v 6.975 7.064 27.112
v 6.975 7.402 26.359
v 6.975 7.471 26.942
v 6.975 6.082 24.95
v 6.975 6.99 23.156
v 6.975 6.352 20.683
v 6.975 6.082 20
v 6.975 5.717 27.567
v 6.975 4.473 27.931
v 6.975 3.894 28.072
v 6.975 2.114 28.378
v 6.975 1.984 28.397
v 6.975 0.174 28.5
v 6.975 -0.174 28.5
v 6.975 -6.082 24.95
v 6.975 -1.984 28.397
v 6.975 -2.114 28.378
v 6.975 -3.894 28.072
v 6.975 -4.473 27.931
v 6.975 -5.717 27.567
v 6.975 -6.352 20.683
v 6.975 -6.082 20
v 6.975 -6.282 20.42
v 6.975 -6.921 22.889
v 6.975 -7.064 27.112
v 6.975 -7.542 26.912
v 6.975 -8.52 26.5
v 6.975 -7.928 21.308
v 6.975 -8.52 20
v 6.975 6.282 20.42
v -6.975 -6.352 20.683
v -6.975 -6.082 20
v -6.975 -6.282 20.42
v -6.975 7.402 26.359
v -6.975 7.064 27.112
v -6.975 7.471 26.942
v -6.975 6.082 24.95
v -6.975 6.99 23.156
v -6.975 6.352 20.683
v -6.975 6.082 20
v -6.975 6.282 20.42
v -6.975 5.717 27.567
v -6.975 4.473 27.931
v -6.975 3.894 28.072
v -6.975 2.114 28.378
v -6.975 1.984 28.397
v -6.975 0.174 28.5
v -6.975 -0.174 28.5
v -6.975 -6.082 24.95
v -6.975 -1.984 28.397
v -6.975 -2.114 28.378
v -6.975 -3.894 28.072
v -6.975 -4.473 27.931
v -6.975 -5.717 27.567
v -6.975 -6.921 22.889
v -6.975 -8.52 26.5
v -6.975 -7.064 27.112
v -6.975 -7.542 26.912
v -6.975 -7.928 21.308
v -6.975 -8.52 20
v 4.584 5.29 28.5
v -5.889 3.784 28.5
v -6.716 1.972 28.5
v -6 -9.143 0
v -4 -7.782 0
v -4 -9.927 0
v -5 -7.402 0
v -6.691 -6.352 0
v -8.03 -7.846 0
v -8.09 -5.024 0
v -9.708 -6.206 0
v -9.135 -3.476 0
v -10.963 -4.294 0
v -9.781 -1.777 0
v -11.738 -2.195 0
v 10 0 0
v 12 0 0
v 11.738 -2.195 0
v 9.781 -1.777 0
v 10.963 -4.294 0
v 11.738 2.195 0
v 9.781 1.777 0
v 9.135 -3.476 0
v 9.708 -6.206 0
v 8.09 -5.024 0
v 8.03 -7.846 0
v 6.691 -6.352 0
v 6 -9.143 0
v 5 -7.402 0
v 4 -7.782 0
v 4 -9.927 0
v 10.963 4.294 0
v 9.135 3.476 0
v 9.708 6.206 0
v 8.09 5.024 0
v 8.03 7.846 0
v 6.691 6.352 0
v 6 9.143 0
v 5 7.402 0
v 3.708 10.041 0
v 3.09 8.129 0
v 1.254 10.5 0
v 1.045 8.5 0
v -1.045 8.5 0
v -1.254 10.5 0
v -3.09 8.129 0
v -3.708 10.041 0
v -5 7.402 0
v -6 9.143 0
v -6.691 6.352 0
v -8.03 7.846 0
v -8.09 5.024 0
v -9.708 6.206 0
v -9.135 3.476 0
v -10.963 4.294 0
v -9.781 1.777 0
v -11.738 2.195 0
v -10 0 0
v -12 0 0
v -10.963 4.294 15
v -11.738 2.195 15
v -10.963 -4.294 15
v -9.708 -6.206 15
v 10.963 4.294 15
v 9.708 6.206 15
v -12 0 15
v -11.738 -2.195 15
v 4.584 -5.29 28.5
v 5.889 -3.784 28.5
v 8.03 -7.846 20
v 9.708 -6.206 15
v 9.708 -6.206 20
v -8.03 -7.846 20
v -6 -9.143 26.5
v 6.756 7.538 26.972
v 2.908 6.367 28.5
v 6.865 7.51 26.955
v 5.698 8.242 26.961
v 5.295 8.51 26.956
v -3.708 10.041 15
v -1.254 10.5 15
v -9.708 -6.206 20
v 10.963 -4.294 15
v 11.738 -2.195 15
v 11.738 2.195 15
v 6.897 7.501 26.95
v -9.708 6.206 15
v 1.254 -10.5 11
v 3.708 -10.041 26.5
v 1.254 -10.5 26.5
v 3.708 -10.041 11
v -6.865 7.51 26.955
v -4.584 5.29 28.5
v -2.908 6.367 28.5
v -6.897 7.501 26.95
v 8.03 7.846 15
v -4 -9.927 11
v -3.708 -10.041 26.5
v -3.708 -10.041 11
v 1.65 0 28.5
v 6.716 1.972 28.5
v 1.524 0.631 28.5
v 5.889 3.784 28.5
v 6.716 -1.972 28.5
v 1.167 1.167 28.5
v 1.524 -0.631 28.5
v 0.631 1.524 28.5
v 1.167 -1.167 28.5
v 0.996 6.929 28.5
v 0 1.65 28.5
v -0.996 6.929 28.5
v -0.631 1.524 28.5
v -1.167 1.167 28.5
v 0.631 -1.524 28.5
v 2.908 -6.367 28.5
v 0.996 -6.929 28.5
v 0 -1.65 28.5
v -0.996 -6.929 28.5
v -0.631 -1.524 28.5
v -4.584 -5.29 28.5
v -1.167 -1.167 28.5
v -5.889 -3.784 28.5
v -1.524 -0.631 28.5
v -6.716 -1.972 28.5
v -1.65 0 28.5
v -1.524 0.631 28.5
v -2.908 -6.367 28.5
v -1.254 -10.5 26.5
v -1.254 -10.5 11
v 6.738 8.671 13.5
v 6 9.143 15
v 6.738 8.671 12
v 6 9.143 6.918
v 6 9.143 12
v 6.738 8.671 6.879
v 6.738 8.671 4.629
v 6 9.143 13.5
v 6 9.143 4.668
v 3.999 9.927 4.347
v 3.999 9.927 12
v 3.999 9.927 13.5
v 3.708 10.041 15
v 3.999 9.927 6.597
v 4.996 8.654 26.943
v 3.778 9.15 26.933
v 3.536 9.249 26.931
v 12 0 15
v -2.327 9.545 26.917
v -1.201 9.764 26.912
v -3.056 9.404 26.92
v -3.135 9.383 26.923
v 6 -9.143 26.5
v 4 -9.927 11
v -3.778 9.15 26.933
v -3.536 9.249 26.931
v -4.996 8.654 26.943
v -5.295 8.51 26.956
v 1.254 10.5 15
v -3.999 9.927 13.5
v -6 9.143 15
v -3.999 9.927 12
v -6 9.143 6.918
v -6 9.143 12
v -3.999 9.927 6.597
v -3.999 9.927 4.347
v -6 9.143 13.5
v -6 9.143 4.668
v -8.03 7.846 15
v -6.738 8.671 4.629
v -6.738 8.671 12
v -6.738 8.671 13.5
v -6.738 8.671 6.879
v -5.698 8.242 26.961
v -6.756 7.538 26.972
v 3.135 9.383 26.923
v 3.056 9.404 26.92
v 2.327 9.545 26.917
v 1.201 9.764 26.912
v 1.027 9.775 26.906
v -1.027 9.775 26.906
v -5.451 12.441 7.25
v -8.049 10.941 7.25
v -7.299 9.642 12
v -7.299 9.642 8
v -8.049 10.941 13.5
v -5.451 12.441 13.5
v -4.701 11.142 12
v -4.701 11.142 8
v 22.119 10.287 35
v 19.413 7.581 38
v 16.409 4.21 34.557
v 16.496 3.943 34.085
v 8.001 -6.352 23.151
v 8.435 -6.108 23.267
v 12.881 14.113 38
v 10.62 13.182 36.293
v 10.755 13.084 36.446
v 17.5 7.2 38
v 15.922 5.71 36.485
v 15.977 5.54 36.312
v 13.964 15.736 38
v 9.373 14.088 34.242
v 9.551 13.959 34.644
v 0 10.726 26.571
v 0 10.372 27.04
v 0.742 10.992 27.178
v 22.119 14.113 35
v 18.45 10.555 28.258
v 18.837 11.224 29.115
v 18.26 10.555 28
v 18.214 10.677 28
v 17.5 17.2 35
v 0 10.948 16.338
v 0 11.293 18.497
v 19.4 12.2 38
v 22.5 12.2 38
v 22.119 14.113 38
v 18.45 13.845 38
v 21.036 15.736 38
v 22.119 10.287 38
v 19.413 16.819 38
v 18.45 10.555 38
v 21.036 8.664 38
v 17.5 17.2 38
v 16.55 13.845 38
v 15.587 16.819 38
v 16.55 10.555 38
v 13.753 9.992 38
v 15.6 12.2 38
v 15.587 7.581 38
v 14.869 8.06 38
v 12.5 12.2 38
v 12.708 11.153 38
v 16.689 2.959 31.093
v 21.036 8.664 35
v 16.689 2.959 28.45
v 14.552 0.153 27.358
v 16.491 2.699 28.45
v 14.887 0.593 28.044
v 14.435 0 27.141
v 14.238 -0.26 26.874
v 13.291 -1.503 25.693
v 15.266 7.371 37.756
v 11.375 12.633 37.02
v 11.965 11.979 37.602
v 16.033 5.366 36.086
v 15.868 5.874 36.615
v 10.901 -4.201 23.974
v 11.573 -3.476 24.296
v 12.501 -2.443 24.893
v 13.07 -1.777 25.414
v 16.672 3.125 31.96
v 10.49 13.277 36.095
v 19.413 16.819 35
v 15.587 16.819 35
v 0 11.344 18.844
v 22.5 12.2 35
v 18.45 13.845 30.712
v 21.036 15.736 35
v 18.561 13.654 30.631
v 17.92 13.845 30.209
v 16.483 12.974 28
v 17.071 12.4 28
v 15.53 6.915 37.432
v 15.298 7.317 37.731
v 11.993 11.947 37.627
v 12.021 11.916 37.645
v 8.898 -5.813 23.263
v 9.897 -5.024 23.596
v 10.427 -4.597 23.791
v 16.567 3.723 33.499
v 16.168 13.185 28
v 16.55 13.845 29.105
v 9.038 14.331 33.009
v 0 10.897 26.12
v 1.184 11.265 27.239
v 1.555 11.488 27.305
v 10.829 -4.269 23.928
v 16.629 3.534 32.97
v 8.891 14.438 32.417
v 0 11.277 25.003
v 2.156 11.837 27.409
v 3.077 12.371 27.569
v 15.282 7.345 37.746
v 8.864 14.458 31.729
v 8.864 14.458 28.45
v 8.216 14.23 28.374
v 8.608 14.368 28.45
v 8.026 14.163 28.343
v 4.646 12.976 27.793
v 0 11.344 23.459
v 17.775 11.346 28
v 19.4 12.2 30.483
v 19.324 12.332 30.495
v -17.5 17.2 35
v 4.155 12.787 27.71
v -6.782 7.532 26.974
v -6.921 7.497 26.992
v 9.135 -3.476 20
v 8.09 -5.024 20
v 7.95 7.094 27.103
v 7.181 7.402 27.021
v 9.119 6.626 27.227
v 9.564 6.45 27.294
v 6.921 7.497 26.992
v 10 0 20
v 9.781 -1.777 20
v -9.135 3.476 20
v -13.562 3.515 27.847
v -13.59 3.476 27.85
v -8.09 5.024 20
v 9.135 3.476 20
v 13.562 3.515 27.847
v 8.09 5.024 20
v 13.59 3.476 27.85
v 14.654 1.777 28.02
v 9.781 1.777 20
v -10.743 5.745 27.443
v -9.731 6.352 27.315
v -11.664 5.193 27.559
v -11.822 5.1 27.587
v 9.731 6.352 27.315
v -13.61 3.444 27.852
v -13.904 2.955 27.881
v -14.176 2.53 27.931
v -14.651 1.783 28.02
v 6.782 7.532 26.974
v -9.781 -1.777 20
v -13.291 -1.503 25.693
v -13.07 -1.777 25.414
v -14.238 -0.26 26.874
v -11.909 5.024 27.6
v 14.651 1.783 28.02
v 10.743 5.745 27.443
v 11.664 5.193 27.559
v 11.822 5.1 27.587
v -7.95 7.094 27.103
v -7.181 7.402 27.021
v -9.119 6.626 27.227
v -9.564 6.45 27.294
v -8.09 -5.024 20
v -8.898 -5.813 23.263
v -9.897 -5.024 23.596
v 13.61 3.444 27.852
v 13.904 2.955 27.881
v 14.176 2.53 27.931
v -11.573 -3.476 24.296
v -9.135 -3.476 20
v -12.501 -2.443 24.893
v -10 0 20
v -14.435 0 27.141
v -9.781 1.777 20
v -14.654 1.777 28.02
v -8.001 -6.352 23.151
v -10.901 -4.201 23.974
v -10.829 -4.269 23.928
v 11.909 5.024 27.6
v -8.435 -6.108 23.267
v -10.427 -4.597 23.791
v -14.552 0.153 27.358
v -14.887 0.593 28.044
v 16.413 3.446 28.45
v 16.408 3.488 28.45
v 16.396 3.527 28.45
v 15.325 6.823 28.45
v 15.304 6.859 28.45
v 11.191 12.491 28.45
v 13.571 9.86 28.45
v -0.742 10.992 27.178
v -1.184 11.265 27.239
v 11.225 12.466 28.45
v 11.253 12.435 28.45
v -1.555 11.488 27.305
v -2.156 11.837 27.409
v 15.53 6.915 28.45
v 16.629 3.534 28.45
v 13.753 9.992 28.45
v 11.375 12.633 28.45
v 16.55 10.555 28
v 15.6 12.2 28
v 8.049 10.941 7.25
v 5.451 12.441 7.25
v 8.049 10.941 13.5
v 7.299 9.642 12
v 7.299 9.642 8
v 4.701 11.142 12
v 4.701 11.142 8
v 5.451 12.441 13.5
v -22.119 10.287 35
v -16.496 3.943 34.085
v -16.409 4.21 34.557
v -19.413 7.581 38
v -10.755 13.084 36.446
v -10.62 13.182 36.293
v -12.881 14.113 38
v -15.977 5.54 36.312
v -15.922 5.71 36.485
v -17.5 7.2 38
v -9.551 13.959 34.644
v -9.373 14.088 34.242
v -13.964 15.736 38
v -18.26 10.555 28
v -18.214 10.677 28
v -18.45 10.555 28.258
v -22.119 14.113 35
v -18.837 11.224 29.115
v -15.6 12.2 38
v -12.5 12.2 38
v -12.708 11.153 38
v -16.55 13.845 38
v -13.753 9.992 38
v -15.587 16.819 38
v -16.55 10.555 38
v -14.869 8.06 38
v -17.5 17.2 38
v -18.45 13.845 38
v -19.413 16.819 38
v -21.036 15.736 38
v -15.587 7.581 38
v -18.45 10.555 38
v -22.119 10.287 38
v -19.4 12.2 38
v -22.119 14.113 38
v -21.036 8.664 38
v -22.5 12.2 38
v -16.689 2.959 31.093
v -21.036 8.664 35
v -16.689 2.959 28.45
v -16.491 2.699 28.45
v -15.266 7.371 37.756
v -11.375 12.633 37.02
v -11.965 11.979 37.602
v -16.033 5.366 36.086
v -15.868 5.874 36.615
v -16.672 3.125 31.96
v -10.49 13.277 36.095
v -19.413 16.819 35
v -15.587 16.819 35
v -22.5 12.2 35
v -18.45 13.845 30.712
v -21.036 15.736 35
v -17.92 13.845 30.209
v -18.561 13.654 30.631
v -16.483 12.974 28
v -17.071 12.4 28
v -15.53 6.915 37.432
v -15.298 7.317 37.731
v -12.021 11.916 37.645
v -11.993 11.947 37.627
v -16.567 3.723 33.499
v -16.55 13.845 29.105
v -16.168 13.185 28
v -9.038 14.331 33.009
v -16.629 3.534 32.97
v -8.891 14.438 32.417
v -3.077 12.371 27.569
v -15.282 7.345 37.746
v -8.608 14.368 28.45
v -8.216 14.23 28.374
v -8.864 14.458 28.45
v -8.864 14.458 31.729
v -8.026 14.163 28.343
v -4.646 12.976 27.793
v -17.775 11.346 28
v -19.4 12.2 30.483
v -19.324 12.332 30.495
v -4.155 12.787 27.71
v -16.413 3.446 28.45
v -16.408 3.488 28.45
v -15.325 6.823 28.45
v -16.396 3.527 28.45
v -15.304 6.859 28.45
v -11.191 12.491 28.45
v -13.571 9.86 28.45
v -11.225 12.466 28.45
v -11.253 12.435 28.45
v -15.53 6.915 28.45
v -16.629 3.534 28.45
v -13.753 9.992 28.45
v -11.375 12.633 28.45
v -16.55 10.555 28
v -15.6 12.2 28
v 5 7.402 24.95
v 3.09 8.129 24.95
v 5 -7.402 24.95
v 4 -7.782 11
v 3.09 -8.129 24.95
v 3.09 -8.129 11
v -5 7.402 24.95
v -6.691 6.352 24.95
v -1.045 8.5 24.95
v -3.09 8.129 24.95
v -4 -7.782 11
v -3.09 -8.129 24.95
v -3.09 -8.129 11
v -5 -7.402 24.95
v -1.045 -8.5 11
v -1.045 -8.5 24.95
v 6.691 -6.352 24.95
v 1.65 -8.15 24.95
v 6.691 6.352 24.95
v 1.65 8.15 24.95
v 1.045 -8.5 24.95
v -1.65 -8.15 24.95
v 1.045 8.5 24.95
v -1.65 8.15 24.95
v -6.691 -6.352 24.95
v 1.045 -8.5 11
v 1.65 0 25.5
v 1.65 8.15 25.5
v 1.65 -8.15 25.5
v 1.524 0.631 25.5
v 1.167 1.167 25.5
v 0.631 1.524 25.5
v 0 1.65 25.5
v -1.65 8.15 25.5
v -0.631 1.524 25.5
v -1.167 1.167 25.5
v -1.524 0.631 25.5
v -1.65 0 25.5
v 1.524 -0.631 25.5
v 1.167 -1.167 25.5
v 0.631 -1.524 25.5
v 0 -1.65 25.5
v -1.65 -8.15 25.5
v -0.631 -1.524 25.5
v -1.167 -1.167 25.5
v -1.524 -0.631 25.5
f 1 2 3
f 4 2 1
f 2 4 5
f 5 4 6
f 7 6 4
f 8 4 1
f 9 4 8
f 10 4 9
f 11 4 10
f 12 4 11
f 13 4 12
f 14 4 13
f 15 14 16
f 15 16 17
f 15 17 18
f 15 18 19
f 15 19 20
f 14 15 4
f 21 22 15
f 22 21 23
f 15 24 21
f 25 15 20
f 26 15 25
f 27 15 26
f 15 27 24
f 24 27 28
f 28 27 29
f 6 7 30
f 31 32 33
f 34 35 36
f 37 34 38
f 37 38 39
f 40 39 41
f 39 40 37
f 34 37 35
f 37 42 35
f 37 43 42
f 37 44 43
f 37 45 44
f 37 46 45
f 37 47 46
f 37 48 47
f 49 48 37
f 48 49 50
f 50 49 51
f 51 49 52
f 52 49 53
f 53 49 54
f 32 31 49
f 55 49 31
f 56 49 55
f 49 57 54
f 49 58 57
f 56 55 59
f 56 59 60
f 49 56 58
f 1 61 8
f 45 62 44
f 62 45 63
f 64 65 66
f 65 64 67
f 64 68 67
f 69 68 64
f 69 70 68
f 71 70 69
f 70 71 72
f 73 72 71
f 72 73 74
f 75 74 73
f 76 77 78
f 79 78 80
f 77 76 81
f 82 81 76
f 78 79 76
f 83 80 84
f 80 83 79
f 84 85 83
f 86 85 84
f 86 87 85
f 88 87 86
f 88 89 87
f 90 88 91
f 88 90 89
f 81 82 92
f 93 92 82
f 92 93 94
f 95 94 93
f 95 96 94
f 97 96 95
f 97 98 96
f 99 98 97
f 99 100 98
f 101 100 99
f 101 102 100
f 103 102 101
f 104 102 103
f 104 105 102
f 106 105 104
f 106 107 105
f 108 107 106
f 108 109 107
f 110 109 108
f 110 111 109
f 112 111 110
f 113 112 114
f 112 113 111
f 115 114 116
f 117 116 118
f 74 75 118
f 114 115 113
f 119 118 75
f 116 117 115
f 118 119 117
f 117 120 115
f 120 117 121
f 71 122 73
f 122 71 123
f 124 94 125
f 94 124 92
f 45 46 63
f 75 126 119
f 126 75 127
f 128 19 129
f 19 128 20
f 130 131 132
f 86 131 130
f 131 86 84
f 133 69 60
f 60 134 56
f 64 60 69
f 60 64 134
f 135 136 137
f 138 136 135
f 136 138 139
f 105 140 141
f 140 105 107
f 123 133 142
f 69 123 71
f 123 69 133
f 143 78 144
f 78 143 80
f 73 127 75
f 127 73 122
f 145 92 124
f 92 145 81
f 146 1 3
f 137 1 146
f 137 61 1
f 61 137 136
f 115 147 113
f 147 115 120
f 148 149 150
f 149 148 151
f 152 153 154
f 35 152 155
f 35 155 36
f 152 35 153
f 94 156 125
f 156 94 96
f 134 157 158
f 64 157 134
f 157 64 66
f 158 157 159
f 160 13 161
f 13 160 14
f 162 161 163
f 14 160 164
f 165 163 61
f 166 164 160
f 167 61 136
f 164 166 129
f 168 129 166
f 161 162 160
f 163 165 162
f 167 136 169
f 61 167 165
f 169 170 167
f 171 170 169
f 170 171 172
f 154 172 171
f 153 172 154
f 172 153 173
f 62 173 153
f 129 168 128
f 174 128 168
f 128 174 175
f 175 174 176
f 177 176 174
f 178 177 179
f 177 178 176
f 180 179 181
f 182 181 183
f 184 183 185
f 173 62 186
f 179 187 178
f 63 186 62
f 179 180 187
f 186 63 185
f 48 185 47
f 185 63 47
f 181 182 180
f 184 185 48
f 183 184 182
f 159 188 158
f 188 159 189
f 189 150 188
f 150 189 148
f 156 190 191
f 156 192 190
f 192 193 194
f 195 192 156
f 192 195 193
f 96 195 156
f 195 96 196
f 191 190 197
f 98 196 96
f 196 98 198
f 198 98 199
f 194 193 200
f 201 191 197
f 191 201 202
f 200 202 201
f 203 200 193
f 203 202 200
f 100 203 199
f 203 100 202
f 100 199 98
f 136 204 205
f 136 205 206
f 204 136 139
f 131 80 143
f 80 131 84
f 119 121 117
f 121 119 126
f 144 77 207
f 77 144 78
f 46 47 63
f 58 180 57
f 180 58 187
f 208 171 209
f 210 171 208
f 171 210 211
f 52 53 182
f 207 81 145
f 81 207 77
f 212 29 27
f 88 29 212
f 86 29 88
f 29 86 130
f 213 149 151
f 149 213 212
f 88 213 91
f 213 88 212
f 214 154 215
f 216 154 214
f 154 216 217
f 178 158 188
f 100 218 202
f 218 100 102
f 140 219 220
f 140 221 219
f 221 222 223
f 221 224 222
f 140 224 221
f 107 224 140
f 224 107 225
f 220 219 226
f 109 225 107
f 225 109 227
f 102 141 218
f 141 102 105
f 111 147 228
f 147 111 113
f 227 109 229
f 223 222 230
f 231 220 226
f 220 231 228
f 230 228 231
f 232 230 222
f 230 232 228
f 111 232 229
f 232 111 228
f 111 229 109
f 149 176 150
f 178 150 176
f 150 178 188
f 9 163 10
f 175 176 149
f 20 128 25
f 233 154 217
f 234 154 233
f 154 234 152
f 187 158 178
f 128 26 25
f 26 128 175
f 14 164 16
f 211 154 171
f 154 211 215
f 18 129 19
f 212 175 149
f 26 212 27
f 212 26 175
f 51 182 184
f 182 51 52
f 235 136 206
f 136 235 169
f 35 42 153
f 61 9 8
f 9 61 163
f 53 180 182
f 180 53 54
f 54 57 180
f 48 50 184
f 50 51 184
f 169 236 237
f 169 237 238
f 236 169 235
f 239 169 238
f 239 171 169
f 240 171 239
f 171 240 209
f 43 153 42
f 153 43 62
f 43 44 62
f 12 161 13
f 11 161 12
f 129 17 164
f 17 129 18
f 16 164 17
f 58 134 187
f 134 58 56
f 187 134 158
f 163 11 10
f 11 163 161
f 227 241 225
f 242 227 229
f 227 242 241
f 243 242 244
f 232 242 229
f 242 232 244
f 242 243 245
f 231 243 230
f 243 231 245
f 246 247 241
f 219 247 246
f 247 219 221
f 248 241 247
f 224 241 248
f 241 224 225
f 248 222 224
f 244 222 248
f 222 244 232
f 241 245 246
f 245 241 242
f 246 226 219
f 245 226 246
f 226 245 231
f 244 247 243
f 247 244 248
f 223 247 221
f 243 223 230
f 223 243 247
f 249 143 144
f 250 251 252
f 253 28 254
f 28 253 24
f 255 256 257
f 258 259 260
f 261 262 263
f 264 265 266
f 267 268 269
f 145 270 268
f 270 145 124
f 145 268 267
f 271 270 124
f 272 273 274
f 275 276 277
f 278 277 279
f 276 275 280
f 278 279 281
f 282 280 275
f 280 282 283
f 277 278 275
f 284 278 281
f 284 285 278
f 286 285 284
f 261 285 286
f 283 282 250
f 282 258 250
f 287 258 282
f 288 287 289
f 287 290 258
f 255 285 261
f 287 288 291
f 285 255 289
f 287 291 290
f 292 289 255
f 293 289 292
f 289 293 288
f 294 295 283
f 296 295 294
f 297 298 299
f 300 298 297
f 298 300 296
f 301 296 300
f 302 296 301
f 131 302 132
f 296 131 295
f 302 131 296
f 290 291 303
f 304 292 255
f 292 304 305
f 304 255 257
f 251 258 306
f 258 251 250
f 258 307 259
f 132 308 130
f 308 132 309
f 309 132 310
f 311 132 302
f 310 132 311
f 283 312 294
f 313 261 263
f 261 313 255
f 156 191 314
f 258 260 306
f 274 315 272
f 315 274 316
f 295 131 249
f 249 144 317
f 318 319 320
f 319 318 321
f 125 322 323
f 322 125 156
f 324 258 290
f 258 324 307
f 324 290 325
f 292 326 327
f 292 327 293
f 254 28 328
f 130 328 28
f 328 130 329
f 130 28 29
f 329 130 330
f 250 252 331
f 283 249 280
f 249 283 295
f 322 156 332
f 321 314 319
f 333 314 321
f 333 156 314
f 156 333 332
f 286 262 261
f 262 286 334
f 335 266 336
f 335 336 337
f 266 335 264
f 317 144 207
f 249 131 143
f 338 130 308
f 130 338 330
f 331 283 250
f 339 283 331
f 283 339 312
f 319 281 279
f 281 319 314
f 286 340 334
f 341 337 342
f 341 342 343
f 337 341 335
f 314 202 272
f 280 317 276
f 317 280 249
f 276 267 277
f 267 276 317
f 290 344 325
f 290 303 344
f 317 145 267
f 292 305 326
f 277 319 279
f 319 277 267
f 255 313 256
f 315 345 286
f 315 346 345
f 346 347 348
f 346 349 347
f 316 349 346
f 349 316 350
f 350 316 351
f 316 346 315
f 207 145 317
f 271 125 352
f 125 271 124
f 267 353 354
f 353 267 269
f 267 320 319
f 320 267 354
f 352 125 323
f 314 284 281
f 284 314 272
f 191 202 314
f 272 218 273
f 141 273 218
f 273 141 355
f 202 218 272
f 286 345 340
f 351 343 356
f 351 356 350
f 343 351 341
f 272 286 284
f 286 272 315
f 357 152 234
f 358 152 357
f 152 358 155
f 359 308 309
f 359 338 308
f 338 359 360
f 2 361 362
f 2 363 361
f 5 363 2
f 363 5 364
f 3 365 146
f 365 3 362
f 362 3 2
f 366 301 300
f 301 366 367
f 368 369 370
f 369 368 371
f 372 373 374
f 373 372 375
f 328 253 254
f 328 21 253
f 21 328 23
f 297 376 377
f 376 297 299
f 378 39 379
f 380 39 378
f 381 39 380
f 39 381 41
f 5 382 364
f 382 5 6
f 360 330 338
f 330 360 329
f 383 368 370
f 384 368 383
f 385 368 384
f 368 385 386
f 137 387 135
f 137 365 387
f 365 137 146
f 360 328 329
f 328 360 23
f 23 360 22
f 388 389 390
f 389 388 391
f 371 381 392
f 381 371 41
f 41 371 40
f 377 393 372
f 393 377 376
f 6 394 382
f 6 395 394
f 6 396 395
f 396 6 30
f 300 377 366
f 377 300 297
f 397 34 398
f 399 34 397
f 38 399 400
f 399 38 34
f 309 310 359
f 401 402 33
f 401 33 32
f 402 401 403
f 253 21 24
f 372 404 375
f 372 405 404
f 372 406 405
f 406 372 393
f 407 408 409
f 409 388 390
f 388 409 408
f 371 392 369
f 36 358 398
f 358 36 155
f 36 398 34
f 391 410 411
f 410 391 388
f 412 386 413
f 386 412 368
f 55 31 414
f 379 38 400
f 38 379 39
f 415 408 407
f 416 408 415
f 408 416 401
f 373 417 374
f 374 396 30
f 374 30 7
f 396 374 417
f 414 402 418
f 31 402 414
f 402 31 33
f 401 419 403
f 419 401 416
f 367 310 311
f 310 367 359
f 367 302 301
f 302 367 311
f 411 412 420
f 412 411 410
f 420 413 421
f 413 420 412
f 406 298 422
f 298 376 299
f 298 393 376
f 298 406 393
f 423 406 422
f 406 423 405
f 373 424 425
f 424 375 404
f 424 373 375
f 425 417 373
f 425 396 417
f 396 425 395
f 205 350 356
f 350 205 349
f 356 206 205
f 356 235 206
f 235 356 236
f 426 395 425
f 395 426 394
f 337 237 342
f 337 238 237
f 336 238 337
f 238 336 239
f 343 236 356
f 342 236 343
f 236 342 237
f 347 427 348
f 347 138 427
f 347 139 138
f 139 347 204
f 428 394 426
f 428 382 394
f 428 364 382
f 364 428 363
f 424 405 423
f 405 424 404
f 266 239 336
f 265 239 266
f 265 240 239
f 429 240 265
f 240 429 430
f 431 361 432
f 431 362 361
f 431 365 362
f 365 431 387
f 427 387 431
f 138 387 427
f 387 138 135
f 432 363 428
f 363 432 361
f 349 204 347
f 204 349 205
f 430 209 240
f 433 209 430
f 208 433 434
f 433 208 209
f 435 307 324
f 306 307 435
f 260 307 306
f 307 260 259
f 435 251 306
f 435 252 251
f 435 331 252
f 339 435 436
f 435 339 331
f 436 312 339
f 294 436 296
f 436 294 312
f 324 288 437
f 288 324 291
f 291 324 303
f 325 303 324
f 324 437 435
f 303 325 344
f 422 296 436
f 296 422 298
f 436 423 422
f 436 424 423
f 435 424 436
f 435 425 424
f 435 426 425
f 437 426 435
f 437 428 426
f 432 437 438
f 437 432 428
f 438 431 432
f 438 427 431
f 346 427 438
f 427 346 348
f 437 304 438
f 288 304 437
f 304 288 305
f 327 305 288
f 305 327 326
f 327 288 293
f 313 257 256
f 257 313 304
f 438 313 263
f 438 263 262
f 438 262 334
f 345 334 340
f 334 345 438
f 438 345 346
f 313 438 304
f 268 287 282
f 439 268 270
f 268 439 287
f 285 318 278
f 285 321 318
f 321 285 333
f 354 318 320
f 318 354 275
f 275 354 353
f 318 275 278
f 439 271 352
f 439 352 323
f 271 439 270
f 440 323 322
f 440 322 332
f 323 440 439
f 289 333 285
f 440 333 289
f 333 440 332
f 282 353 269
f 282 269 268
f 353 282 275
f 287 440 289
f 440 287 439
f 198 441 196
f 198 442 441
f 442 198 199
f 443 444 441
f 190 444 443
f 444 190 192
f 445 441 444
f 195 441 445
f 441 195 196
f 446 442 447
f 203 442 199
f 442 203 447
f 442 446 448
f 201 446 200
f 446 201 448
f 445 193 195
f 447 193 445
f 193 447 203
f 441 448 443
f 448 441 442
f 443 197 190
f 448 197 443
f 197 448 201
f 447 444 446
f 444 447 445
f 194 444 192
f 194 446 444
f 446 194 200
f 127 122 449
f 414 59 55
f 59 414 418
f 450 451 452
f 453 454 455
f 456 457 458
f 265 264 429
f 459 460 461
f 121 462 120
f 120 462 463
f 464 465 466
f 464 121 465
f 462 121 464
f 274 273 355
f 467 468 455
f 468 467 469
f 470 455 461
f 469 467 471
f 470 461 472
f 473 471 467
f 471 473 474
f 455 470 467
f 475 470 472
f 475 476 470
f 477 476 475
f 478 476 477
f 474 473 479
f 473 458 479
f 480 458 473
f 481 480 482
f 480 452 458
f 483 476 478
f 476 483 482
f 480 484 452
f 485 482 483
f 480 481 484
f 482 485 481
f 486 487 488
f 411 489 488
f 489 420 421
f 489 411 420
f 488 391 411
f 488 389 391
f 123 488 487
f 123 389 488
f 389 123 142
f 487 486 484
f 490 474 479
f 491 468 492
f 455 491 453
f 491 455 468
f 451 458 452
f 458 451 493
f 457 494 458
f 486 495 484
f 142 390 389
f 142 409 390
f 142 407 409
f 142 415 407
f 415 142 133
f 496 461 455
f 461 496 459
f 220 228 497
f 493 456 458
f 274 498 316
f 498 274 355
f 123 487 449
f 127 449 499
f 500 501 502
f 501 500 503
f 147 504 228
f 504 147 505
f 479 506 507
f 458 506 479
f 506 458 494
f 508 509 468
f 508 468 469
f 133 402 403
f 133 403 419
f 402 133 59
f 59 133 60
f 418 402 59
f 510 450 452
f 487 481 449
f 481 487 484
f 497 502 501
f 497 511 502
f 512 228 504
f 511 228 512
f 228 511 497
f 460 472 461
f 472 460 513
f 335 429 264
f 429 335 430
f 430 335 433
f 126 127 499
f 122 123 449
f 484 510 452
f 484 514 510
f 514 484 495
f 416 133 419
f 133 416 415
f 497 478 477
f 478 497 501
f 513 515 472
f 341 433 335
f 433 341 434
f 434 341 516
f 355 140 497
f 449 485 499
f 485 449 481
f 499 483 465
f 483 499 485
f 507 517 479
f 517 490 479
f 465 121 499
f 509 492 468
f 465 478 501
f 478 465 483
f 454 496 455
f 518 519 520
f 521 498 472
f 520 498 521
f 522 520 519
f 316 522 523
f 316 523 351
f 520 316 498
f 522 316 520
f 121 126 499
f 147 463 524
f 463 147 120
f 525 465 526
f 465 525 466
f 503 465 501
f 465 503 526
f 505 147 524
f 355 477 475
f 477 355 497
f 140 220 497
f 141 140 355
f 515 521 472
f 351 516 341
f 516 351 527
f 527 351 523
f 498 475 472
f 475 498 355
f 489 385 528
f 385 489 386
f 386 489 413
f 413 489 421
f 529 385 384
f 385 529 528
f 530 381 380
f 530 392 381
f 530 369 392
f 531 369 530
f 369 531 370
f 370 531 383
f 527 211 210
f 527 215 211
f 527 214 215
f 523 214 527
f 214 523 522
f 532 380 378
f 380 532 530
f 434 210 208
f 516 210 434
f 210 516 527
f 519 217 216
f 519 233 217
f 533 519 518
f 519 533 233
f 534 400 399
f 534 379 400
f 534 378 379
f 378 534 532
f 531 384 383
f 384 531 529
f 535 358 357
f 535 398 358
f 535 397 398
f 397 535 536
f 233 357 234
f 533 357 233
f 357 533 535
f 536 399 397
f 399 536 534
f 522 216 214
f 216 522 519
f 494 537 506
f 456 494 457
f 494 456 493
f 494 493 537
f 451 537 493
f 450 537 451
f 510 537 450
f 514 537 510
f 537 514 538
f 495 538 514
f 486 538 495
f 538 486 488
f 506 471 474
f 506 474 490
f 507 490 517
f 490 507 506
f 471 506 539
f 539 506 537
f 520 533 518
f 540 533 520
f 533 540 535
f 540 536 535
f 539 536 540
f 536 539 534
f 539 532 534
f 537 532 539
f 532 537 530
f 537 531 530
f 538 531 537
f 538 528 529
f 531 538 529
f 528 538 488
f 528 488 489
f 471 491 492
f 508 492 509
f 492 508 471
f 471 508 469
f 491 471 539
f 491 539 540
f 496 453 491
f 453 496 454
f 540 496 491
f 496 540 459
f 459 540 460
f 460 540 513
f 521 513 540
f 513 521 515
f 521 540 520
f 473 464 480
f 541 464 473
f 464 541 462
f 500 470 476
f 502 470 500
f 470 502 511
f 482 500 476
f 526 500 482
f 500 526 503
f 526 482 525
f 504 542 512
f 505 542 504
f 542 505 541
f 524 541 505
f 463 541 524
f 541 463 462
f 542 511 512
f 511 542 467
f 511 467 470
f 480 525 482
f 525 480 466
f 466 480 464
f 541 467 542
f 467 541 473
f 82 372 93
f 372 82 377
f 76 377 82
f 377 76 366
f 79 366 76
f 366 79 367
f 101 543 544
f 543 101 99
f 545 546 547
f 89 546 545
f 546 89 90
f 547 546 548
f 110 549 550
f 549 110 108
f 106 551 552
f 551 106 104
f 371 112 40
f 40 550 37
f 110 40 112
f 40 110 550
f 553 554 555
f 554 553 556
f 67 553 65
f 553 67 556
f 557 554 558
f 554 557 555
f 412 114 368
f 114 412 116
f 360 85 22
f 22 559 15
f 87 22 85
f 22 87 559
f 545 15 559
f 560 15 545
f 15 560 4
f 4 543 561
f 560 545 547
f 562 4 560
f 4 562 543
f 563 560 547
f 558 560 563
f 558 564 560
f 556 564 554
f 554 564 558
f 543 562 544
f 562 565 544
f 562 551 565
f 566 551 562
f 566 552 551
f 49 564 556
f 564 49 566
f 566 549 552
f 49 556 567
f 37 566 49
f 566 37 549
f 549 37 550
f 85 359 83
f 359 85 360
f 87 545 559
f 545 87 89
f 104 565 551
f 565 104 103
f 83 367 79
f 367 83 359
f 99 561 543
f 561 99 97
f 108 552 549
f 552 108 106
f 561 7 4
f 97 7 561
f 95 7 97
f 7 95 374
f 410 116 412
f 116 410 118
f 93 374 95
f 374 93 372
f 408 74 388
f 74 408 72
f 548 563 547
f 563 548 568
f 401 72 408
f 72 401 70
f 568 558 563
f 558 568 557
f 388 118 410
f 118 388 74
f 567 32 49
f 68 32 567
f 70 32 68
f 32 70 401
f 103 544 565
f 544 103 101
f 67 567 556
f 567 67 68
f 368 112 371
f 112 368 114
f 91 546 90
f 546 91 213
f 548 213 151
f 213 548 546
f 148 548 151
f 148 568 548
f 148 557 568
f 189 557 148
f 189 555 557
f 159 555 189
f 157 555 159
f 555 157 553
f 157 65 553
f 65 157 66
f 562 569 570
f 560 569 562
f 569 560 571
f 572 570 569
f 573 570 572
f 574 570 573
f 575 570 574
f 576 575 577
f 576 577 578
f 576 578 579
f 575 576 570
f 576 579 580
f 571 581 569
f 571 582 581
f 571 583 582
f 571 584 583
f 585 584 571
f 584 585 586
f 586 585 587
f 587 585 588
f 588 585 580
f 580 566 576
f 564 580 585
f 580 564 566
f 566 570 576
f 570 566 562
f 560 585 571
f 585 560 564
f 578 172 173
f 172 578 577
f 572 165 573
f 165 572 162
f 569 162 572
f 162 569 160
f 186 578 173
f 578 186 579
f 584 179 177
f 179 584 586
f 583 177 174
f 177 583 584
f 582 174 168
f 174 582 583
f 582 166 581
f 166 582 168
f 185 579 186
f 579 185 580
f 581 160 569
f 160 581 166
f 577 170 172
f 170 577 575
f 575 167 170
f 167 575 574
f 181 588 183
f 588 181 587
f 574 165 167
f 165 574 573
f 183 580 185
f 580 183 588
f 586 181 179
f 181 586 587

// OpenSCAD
use <./utilities.scad>;

ns_flex = [2.5,1,0.75];
ns_outer_r = 7;
ns_top_h = 20;
band_clearance_r = 3;
ss_wall_t = 2;
d=0.05;
actuator_h = 6;
zflex_l = 1.5;    //length and height of flexures
zflex_t = 0.75;

function ss_inner(travel)=[2*(ns_outer_r+band_clearance_r),2*(ns_outer_r+1.5),ns_top_h+travel];
function ss_outer(travel)=ss_inner(travel)+[2*ss_wall_t,2*ss_wall_t,3];

module cable_tie_point(t=1.5, gap=[3,1.5,4]){
    w=gap[0];
    sequential_hull(){
        translate([0,-t/2,-gap[1]-gap[2]/2-5*t/4]) cube([w,t,t/2],center=true);
        translate([0,gap[1]+t/2,-gap[2]/2-t/4]) cube([w,t,t/2],center=true);
        translate([0,gap[1]+t/2,gap[2]/2+t/2]) cube([w,t,t],center=true);
        translate([0,-t/2,gap[2]/2+t/2]) cube([w,t,t],center=true);
    }
}

module screw_seat(travel=5, motor_lugs=false){
	inner=ss_inner(travel);
	outer=ss_outer(travel);
    top_h=outer[2]-1.5;
    motor_shaft_pos=[0,20,outer[2]+d];
    motor_screw_pos=[35/2,motor_shaft_pos[1]-7.8,outer[2]+10];
    t=3;
    module inner_silhouette(h=d){
        resize([inner[0],inner[1],h]) cylinder(r=inner[1]);
    }
	difference(){
		union(){ 
            //////// body of seat (cylinder with conical top)
            difference(){
                hull(){
                    resize(outer-[0,0,1.5]) cylinder(r=outer[1]); //body
                    translate([0,0,outer[2]-1.5]) cylinder(r=outer[0]/2-5,h=2); //body
                }
                //hole for elastic bands	
                reflect([1,0,0]) translate([outer[0]/2-2.5,0,inner[2]]) cube([5+d,outer[1],2*travel],center=true);
			}
            //////// motor lugs
            if(motor_lugs) reflect([1,0,0]) difference(){
                union(){
                    hull(){
                        translate(motor_screw_pos) mirror([0,0,1]) cylinder(r=5,h=3);
                        translate([0,0,inner[2]-travel-5]) resize([outer[0],outer[1],5]) cylinder(r=outer[1]);
                    }
                    rotate(30) translate([0,outer[1]/2,inner[2]-travel-10]) cable_tie_point();
                }
                //space for gears
                translate([0,0,outer[2]-1.5]) cylinder(r1=8,r2=17,h=2);
                translate([0,0,outer[2]-1.5+2-d]) cylinder(h=999,r=17);
                //hollow inside of the structure
                sequential_hull(){
                    translate([0,0,0]) inner_silhouette();
                    translate([0,0,inner[2]-travel]) inner_silhouette();
                    translate([0,0,outer[2]+d]) resize([30,inner[1],999]) cylinder(h=999,r=15);
                }
                //mounting screws
                translate(motor_screw_pos) cylinder(r=1.9,h=20,center=true);
            }

		//		
		}

		//clearance for actuator
		translate([0,0,-d]) resize(inner) cylinder(r=inner[1]);
		translate([0,-outer[1]/2,0]) cube([8,ss_wall_t*3,(actuator_h+travel)*2],center=true);

		//hole for nut at top
		translate([0,0,inner[2]]) cube([3.3,inner[1]-0.7,1],center=true);
		translate([0,0,0]) cylinder(r=3.3/2,h=999, $fn=16, center=true);
	}
}

module screw_seat_spring(travel=5, motor_lugs=false){
	inner=ss_inner(travel);
	outer=ss_outer(travel);
    top_h=outer[2]-1.5;
    motor_shaft_pos=[0,20,outer[2]+d];
    motor_screw_pos=[35/2,motor_shaft_pos[1]-7.8,outer[2]+10];
    t=3;
    module inner_silhouette(h=d){
        resize([inner[0],inner[1],h]) cylinder(r=inner[1]);
    }
	difference(){
		union(){ 
            //////// body of seat (cylinder with conical top)
            difference(){
                hull(){
                    resize(outer-[0,0,1.5]) cylinder(r=outer[1]); //body
                    translate([0,0,outer[2]-1.5]) cylinder(r=outer[0]/2-5,h=2); //body
                }
                //hole for spring
                translate([0,outer[1]/2-2.5,inner[2]]) cube([outer[0],5+d,20],center=true);
			}
            //////// motor lugs
            if(motor_lugs) reflect([1,0,0]) difference(){
                union(){
                    hull(){
                        translate(motor_screw_pos) mirror([0,0,1]) cylinder(r=5,h=3);
                        translate([0,0,inner[2]-travel-5]) resize([outer[0],outer[1],5]) cylinder(r=outer[1]);
                    }
                    rotate(30) translate([0,outer[1]/2,inner[2]-travel-10]) cable_tie_point();
                }
                //space for gears
                translate([0,0,outer[2]-1.5]) cylinder(r1=8,r2=17,h=2);
                translate([0,0,outer[2]-1.5+2-d]) cylinder(h=999,r=17);
                //hollow inside of the structure
                sequential_hull(){
                    translate([0,0,0]) inner_silhouette();
                    translate([0,0,inner[2]-travel]) inner_silhouette();
                    translate([0,0,outer[2]+d]) resize([30,inner[1],999]) cylinder(h=999,r=15);
                }
                //mounting screws
                translate(motor_screw_pos) cylinder(r=1.9,h=20,center=true);
            }

		//		
		}

		//clearance for actuator
		translate([0,0,-d]) resize(inner) cylinder(r=inner[1]);
		translate([0,-outer[1]/2,0]) cube([8,ss_wall_t*3,(actuator_h+travel)*2],center=true);

		//hole for nut at top
		translate([0,0,inner[2]]) cube([inner[0]-0.7,3.3,1],center=true);
		translate([0,0,0]) cylinder(r=3.3/2,h=999, $fn=16, center=true);
	}
}

module nut_seat_spring(){
	outer_r=5.5; //outer radius
	top_h=ns_top_h; //overall height
	union(){
		//central nut seat
		difference(){
			union(){
				cylinder(r=outer_r,h=ns_top_h);
                difference(){
                    cylinder(r=outer_r+2,h=6);
                    translate([-99,0,6]) rotate([90+30,0,0]) cube([1,1,1]*999);
                }
				
			}

			//nut
			rotate(30) translate([0,0,ns_top_h-9]) nut_from_bottom(3, h=7,chamfer_h=4);
			//make sure the hole for the nut prints ok in the overhang
			//essentially we ensure that the overhang never goes
			//more than 45 degrees (the hexagonal hole would do this)
			//then bridge it at the top.  This tapers nicely into
			//the hexagonal nut hole to avoid spaghetti.
			assign(r=3*0.9*1.2+0.75) assign(w=r*cos(30)*0.8*2) translate([0,0,actuator_h]) sequential_hull(){
				rotate(30) cylinder(r=r,$fn=6,h=r*1.5);
				translate([-w/2,-r,0]) cube([w,r,r]);
				translate([-r*cos(30)*0.8,-999,0]) cube([w,2*r,r]);
			}
			//flexures
			translate([0,0,zflex_t+1]) cube([999,zflex_l,2],center=true);
			//wedge to make flexure
			hull(){
				translate([0,0,zflex_t+1.75]) cube([999,zflex_l,0.5],center=true);
				translate([-999,-outer_r-d,actuator_h+1]) cube([999*2,d,outer_r+4+zflex_t-actuator_h-1]);
			}
			translate([-999,-ns_outer_r-1,actuator_h]) cube([999*2,3,2]); //truncate the yoke so it has a flat bit to mesh neatly with the actuator
		}
	}
}

/*union(){
    screw_seat_spring(5);
    nut_seat_spring();
    translate([-3,-20-4,0]) cube([6,20,6]);
    difference(){
        reflect([1,0,0]) translate([4,-20-4-1-2,0]) cube([2,22,8]);
        scale([0.95,0.95,1]) screw_seat_outline(center=true);
    }
    translate([-6,-20-4-1-2,0]) cube([6*2,2,4]);
    translate([-3,-20-4-1-2,0]) cube([6,6,0.75]);
}*/


module screw_seat_silhouette(adjustment=0,travel=5){
	assign(inner=ss_inner(travel))
	assign(outer=ss_outer(travel))
	resize([outer[0]+adjustment,outer[1]+adjustment]) circle(r=outer[1]); //body
}
module screw_seat_outline(h=999,adjustment=0,center=false){
	linear_extrude(h,center=center) screw_seat_silhouette(adjustment);
}
module elastic_band_base(h=15,tilt=7){
	assign(inner=ss_inner(5))
	assign(outer=ss_outer(5))
	intersection(){
		translate([-1,-1,0]*999) cube([1,1,1]*999*2); //make sure there's nothing below the XY plane
		translate([0,outer[1]/2,0]) rotate([-tilt,0,0]) translate([0,-outer[1]/2,0]) union(){ //tip over from one corner to make foot
			difference(){
				translate([0,0,-10]) resize([outer[0],outer[1],h+10]) cylinder(r=outer[1]); //body (with some below zero to allow spare when we tilt over)
				translate([0,0,-20]) difference(){
					resize([inner[0]-d,inner[1],999]) cylinder(r=inner[1]); //cutout for nut seat
					cube([inner[0]-8,999,20*2+6],center=true); //crossbar for bands
				}
				//indents for elastic bands
				reflect([0,1,0]) translate([0,4,0]) rotate([5,0,0]){
				//	cube([999,2,6],center=true);
					translate([0,0,-10]) cube([inner[0]-7,2,22],center=true);
				}
				//clearance for actuator arm
				translate([0,999,h]) cube([9,999*2,12],center=true);
			}
			intersection(){ //grips for hole in microscope
				difference(){ //hollow extruded ellipse
					translate([0,0,h-5]) resize([inner[0],inner[1],5+1]) cylinder(r=inner[1]);
					translate([0,0,h-6]) resize([inner[0],inner[1],6+2]) cylinder(r1=inner[1],r2=inner[1]-1.5);
				}
				hull(){ //just the bits at either side
					translate([0,0,-10]) cube([999,6,d],center=true);
					translate([0,0,h+1]) cube([999,6,d],center=true);
				}
			}
		}
	}
}
	

module nut_seat_with_flex(){
	assign(
				outer_r=ns_outer_r, //outer radius
				top_h=ns_top_h //overall height
			 ) union(){
		//central nut seat
		difference(){
			union(){
				cylinder(r=ns_outer_r,h=ns_top_h);
				reflect([1,0,0]) sequential_hull(){
					translate([0,0,top_h-8]) cylinder(r=ns_outer_r,h=d);
					translate([0,0,top_h-1]) scale([1+2/ns_outer_r,1,1]) cylinder(r=ns_outer_r,h=1);
				} //flare the top
			}

			//nut
			rotate(30) translate([0,0,ns_top_h-9]) nut_from_bottom(3, h=7,chamfer_h=4);
			//make sure the hole for the nut prints ok in the overhang
			//essentially we ensure that the overhang never goes
			//more than 45 degrees (the hexagonal hole would do this)
			//then bridge it at the top.  This tapers nicely into
			//the hexagonal nut hole to avoid spaghetti.
			assign(r=3*0.9*1.2+0.75) assign(w=r*cos(30)*0.8*2) translate([0,0,actuator_h]) sequential_hull(){
				rotate(30) cylinder(r=r,$fn=6,h=r*1.5);
				translate([-w/2,-r,0]) cube([w,r,r]);
				translate([-r*cos(30)*0.8,-999,0]) cube([w,2*r,r]);
			}
			//flexures
			translate([0,0,zflex_t+1]) cube([999,zflex_l,2],center=true);
			//wedge to make flexure
			hull(){
				translate([0,0,zflex_t+1.75]) cube([999,zflex_l,0.5],center=true);
				translate([-999,-outer_r-d,actuator_h+1]) cube([999*2,d,outer_r+4+zflex_t-actuator_h-1]);
			}
			translate([-999,-ns_outer_r-1,actuator_h]) cube([999*2,3,2]); //truncate the yoke so it has a flat bit to mesh neatly with the actuator

			//elastic bands
			reflect([1,0,0]) reflect([0,1,0]) translate([outer_r-1,0,top_h]){
				cube([2,999,4],center=true);
				translate([0,5,0]) rotate([5,-5,0]) cube([2,4,15],center=true);
			}
		}
	}
}
module back_foot(h=15,tilt=7){

	assign(inner=[0.8,1.1,1]*6*2)
	assign(outer=[0.8,1.1,1]*8*2)
	intersection(){
		translate([-1,-1,0]*999) cube([1,1,1]*999*2); //make sure there's nothing below the XY plane

		translate([0,outer[1]/2,0]) rotate([-tilt,0,0]) translate([0,-outer[1]/2,0]) union(){ //tip over from one corner to make foot
			difference(){
				union(){
					translate([0,0,-10]) resize([outer[0],outer[1],h+10]) cylinder(r=outer[1]); //body (with some below zero to allow spare when we tilt over
					translate([0,0,-10]) resize([inner[0],inner[1],h+5+10]) cylinder(r=inner[1]); //extension at the top
				}
				sequential_hull(){
					translate([0,0,-20]) resize([inner[0]-d,inner[1],d]) cylinder(r=inner[1]); //cutout for nut seat
					translate([0,0,h-4]) resize([inner[0]-d,inner[1],d]) cylinder(r=inner[1]); //cutout for nut seat
					translate([0,0,h-1]) resize([inner[0]-3,inner[1]-2,d]) cylinder(r=inner[1]-1);
					translate([0,0,h-1]) resize([inner[0]-3,inner[1]-2,999]) cylinder(r=inner[1]-1);
				}
				//cable hole
				translate([-1.5,0,h/2]) cube([3,999,999]);
			}
			intersection(){ //grips for hole in microscope
				difference(){ //hollow extruded ellipse
					translate([0,0,-10]) resize([inner[0],inner[1],h+5+10]) cylinder(r=inner[1]);
					translate([0,0,-20]) resize([inner[0]-3,inner[1]-1,999]) cylinder(r=inner[1]-1);
				}
				hull(){ //just the bits at either side
					translate([0,0,-10]) cube([999,10,d],center=true);
					translate([0,0,h+5]) cube([999,6,d],center=true);
				}
			}
			//grips for indents
			reflect([1,0,0]) translate([inner[0]/2,0,h+3]) scale([0.5,1,1]) sphere(r=1);
		}
	}
}


//intersection(){
  screw_seat(motor_lugs=true);
//    translate([0,0,21]) cylinder(r=999,h=999,$fn=8);
//}
//nut_seat_with_flex();
//motor_lugs(); // merged into screw_seat, because it crashes STL export otherwise!! I suspect it's due to the large number of almost-duplicated vertices messing up tesselation...
//screw_seat_silhouette();
//elastic_band_base(tilt=0);
//back_foot();
